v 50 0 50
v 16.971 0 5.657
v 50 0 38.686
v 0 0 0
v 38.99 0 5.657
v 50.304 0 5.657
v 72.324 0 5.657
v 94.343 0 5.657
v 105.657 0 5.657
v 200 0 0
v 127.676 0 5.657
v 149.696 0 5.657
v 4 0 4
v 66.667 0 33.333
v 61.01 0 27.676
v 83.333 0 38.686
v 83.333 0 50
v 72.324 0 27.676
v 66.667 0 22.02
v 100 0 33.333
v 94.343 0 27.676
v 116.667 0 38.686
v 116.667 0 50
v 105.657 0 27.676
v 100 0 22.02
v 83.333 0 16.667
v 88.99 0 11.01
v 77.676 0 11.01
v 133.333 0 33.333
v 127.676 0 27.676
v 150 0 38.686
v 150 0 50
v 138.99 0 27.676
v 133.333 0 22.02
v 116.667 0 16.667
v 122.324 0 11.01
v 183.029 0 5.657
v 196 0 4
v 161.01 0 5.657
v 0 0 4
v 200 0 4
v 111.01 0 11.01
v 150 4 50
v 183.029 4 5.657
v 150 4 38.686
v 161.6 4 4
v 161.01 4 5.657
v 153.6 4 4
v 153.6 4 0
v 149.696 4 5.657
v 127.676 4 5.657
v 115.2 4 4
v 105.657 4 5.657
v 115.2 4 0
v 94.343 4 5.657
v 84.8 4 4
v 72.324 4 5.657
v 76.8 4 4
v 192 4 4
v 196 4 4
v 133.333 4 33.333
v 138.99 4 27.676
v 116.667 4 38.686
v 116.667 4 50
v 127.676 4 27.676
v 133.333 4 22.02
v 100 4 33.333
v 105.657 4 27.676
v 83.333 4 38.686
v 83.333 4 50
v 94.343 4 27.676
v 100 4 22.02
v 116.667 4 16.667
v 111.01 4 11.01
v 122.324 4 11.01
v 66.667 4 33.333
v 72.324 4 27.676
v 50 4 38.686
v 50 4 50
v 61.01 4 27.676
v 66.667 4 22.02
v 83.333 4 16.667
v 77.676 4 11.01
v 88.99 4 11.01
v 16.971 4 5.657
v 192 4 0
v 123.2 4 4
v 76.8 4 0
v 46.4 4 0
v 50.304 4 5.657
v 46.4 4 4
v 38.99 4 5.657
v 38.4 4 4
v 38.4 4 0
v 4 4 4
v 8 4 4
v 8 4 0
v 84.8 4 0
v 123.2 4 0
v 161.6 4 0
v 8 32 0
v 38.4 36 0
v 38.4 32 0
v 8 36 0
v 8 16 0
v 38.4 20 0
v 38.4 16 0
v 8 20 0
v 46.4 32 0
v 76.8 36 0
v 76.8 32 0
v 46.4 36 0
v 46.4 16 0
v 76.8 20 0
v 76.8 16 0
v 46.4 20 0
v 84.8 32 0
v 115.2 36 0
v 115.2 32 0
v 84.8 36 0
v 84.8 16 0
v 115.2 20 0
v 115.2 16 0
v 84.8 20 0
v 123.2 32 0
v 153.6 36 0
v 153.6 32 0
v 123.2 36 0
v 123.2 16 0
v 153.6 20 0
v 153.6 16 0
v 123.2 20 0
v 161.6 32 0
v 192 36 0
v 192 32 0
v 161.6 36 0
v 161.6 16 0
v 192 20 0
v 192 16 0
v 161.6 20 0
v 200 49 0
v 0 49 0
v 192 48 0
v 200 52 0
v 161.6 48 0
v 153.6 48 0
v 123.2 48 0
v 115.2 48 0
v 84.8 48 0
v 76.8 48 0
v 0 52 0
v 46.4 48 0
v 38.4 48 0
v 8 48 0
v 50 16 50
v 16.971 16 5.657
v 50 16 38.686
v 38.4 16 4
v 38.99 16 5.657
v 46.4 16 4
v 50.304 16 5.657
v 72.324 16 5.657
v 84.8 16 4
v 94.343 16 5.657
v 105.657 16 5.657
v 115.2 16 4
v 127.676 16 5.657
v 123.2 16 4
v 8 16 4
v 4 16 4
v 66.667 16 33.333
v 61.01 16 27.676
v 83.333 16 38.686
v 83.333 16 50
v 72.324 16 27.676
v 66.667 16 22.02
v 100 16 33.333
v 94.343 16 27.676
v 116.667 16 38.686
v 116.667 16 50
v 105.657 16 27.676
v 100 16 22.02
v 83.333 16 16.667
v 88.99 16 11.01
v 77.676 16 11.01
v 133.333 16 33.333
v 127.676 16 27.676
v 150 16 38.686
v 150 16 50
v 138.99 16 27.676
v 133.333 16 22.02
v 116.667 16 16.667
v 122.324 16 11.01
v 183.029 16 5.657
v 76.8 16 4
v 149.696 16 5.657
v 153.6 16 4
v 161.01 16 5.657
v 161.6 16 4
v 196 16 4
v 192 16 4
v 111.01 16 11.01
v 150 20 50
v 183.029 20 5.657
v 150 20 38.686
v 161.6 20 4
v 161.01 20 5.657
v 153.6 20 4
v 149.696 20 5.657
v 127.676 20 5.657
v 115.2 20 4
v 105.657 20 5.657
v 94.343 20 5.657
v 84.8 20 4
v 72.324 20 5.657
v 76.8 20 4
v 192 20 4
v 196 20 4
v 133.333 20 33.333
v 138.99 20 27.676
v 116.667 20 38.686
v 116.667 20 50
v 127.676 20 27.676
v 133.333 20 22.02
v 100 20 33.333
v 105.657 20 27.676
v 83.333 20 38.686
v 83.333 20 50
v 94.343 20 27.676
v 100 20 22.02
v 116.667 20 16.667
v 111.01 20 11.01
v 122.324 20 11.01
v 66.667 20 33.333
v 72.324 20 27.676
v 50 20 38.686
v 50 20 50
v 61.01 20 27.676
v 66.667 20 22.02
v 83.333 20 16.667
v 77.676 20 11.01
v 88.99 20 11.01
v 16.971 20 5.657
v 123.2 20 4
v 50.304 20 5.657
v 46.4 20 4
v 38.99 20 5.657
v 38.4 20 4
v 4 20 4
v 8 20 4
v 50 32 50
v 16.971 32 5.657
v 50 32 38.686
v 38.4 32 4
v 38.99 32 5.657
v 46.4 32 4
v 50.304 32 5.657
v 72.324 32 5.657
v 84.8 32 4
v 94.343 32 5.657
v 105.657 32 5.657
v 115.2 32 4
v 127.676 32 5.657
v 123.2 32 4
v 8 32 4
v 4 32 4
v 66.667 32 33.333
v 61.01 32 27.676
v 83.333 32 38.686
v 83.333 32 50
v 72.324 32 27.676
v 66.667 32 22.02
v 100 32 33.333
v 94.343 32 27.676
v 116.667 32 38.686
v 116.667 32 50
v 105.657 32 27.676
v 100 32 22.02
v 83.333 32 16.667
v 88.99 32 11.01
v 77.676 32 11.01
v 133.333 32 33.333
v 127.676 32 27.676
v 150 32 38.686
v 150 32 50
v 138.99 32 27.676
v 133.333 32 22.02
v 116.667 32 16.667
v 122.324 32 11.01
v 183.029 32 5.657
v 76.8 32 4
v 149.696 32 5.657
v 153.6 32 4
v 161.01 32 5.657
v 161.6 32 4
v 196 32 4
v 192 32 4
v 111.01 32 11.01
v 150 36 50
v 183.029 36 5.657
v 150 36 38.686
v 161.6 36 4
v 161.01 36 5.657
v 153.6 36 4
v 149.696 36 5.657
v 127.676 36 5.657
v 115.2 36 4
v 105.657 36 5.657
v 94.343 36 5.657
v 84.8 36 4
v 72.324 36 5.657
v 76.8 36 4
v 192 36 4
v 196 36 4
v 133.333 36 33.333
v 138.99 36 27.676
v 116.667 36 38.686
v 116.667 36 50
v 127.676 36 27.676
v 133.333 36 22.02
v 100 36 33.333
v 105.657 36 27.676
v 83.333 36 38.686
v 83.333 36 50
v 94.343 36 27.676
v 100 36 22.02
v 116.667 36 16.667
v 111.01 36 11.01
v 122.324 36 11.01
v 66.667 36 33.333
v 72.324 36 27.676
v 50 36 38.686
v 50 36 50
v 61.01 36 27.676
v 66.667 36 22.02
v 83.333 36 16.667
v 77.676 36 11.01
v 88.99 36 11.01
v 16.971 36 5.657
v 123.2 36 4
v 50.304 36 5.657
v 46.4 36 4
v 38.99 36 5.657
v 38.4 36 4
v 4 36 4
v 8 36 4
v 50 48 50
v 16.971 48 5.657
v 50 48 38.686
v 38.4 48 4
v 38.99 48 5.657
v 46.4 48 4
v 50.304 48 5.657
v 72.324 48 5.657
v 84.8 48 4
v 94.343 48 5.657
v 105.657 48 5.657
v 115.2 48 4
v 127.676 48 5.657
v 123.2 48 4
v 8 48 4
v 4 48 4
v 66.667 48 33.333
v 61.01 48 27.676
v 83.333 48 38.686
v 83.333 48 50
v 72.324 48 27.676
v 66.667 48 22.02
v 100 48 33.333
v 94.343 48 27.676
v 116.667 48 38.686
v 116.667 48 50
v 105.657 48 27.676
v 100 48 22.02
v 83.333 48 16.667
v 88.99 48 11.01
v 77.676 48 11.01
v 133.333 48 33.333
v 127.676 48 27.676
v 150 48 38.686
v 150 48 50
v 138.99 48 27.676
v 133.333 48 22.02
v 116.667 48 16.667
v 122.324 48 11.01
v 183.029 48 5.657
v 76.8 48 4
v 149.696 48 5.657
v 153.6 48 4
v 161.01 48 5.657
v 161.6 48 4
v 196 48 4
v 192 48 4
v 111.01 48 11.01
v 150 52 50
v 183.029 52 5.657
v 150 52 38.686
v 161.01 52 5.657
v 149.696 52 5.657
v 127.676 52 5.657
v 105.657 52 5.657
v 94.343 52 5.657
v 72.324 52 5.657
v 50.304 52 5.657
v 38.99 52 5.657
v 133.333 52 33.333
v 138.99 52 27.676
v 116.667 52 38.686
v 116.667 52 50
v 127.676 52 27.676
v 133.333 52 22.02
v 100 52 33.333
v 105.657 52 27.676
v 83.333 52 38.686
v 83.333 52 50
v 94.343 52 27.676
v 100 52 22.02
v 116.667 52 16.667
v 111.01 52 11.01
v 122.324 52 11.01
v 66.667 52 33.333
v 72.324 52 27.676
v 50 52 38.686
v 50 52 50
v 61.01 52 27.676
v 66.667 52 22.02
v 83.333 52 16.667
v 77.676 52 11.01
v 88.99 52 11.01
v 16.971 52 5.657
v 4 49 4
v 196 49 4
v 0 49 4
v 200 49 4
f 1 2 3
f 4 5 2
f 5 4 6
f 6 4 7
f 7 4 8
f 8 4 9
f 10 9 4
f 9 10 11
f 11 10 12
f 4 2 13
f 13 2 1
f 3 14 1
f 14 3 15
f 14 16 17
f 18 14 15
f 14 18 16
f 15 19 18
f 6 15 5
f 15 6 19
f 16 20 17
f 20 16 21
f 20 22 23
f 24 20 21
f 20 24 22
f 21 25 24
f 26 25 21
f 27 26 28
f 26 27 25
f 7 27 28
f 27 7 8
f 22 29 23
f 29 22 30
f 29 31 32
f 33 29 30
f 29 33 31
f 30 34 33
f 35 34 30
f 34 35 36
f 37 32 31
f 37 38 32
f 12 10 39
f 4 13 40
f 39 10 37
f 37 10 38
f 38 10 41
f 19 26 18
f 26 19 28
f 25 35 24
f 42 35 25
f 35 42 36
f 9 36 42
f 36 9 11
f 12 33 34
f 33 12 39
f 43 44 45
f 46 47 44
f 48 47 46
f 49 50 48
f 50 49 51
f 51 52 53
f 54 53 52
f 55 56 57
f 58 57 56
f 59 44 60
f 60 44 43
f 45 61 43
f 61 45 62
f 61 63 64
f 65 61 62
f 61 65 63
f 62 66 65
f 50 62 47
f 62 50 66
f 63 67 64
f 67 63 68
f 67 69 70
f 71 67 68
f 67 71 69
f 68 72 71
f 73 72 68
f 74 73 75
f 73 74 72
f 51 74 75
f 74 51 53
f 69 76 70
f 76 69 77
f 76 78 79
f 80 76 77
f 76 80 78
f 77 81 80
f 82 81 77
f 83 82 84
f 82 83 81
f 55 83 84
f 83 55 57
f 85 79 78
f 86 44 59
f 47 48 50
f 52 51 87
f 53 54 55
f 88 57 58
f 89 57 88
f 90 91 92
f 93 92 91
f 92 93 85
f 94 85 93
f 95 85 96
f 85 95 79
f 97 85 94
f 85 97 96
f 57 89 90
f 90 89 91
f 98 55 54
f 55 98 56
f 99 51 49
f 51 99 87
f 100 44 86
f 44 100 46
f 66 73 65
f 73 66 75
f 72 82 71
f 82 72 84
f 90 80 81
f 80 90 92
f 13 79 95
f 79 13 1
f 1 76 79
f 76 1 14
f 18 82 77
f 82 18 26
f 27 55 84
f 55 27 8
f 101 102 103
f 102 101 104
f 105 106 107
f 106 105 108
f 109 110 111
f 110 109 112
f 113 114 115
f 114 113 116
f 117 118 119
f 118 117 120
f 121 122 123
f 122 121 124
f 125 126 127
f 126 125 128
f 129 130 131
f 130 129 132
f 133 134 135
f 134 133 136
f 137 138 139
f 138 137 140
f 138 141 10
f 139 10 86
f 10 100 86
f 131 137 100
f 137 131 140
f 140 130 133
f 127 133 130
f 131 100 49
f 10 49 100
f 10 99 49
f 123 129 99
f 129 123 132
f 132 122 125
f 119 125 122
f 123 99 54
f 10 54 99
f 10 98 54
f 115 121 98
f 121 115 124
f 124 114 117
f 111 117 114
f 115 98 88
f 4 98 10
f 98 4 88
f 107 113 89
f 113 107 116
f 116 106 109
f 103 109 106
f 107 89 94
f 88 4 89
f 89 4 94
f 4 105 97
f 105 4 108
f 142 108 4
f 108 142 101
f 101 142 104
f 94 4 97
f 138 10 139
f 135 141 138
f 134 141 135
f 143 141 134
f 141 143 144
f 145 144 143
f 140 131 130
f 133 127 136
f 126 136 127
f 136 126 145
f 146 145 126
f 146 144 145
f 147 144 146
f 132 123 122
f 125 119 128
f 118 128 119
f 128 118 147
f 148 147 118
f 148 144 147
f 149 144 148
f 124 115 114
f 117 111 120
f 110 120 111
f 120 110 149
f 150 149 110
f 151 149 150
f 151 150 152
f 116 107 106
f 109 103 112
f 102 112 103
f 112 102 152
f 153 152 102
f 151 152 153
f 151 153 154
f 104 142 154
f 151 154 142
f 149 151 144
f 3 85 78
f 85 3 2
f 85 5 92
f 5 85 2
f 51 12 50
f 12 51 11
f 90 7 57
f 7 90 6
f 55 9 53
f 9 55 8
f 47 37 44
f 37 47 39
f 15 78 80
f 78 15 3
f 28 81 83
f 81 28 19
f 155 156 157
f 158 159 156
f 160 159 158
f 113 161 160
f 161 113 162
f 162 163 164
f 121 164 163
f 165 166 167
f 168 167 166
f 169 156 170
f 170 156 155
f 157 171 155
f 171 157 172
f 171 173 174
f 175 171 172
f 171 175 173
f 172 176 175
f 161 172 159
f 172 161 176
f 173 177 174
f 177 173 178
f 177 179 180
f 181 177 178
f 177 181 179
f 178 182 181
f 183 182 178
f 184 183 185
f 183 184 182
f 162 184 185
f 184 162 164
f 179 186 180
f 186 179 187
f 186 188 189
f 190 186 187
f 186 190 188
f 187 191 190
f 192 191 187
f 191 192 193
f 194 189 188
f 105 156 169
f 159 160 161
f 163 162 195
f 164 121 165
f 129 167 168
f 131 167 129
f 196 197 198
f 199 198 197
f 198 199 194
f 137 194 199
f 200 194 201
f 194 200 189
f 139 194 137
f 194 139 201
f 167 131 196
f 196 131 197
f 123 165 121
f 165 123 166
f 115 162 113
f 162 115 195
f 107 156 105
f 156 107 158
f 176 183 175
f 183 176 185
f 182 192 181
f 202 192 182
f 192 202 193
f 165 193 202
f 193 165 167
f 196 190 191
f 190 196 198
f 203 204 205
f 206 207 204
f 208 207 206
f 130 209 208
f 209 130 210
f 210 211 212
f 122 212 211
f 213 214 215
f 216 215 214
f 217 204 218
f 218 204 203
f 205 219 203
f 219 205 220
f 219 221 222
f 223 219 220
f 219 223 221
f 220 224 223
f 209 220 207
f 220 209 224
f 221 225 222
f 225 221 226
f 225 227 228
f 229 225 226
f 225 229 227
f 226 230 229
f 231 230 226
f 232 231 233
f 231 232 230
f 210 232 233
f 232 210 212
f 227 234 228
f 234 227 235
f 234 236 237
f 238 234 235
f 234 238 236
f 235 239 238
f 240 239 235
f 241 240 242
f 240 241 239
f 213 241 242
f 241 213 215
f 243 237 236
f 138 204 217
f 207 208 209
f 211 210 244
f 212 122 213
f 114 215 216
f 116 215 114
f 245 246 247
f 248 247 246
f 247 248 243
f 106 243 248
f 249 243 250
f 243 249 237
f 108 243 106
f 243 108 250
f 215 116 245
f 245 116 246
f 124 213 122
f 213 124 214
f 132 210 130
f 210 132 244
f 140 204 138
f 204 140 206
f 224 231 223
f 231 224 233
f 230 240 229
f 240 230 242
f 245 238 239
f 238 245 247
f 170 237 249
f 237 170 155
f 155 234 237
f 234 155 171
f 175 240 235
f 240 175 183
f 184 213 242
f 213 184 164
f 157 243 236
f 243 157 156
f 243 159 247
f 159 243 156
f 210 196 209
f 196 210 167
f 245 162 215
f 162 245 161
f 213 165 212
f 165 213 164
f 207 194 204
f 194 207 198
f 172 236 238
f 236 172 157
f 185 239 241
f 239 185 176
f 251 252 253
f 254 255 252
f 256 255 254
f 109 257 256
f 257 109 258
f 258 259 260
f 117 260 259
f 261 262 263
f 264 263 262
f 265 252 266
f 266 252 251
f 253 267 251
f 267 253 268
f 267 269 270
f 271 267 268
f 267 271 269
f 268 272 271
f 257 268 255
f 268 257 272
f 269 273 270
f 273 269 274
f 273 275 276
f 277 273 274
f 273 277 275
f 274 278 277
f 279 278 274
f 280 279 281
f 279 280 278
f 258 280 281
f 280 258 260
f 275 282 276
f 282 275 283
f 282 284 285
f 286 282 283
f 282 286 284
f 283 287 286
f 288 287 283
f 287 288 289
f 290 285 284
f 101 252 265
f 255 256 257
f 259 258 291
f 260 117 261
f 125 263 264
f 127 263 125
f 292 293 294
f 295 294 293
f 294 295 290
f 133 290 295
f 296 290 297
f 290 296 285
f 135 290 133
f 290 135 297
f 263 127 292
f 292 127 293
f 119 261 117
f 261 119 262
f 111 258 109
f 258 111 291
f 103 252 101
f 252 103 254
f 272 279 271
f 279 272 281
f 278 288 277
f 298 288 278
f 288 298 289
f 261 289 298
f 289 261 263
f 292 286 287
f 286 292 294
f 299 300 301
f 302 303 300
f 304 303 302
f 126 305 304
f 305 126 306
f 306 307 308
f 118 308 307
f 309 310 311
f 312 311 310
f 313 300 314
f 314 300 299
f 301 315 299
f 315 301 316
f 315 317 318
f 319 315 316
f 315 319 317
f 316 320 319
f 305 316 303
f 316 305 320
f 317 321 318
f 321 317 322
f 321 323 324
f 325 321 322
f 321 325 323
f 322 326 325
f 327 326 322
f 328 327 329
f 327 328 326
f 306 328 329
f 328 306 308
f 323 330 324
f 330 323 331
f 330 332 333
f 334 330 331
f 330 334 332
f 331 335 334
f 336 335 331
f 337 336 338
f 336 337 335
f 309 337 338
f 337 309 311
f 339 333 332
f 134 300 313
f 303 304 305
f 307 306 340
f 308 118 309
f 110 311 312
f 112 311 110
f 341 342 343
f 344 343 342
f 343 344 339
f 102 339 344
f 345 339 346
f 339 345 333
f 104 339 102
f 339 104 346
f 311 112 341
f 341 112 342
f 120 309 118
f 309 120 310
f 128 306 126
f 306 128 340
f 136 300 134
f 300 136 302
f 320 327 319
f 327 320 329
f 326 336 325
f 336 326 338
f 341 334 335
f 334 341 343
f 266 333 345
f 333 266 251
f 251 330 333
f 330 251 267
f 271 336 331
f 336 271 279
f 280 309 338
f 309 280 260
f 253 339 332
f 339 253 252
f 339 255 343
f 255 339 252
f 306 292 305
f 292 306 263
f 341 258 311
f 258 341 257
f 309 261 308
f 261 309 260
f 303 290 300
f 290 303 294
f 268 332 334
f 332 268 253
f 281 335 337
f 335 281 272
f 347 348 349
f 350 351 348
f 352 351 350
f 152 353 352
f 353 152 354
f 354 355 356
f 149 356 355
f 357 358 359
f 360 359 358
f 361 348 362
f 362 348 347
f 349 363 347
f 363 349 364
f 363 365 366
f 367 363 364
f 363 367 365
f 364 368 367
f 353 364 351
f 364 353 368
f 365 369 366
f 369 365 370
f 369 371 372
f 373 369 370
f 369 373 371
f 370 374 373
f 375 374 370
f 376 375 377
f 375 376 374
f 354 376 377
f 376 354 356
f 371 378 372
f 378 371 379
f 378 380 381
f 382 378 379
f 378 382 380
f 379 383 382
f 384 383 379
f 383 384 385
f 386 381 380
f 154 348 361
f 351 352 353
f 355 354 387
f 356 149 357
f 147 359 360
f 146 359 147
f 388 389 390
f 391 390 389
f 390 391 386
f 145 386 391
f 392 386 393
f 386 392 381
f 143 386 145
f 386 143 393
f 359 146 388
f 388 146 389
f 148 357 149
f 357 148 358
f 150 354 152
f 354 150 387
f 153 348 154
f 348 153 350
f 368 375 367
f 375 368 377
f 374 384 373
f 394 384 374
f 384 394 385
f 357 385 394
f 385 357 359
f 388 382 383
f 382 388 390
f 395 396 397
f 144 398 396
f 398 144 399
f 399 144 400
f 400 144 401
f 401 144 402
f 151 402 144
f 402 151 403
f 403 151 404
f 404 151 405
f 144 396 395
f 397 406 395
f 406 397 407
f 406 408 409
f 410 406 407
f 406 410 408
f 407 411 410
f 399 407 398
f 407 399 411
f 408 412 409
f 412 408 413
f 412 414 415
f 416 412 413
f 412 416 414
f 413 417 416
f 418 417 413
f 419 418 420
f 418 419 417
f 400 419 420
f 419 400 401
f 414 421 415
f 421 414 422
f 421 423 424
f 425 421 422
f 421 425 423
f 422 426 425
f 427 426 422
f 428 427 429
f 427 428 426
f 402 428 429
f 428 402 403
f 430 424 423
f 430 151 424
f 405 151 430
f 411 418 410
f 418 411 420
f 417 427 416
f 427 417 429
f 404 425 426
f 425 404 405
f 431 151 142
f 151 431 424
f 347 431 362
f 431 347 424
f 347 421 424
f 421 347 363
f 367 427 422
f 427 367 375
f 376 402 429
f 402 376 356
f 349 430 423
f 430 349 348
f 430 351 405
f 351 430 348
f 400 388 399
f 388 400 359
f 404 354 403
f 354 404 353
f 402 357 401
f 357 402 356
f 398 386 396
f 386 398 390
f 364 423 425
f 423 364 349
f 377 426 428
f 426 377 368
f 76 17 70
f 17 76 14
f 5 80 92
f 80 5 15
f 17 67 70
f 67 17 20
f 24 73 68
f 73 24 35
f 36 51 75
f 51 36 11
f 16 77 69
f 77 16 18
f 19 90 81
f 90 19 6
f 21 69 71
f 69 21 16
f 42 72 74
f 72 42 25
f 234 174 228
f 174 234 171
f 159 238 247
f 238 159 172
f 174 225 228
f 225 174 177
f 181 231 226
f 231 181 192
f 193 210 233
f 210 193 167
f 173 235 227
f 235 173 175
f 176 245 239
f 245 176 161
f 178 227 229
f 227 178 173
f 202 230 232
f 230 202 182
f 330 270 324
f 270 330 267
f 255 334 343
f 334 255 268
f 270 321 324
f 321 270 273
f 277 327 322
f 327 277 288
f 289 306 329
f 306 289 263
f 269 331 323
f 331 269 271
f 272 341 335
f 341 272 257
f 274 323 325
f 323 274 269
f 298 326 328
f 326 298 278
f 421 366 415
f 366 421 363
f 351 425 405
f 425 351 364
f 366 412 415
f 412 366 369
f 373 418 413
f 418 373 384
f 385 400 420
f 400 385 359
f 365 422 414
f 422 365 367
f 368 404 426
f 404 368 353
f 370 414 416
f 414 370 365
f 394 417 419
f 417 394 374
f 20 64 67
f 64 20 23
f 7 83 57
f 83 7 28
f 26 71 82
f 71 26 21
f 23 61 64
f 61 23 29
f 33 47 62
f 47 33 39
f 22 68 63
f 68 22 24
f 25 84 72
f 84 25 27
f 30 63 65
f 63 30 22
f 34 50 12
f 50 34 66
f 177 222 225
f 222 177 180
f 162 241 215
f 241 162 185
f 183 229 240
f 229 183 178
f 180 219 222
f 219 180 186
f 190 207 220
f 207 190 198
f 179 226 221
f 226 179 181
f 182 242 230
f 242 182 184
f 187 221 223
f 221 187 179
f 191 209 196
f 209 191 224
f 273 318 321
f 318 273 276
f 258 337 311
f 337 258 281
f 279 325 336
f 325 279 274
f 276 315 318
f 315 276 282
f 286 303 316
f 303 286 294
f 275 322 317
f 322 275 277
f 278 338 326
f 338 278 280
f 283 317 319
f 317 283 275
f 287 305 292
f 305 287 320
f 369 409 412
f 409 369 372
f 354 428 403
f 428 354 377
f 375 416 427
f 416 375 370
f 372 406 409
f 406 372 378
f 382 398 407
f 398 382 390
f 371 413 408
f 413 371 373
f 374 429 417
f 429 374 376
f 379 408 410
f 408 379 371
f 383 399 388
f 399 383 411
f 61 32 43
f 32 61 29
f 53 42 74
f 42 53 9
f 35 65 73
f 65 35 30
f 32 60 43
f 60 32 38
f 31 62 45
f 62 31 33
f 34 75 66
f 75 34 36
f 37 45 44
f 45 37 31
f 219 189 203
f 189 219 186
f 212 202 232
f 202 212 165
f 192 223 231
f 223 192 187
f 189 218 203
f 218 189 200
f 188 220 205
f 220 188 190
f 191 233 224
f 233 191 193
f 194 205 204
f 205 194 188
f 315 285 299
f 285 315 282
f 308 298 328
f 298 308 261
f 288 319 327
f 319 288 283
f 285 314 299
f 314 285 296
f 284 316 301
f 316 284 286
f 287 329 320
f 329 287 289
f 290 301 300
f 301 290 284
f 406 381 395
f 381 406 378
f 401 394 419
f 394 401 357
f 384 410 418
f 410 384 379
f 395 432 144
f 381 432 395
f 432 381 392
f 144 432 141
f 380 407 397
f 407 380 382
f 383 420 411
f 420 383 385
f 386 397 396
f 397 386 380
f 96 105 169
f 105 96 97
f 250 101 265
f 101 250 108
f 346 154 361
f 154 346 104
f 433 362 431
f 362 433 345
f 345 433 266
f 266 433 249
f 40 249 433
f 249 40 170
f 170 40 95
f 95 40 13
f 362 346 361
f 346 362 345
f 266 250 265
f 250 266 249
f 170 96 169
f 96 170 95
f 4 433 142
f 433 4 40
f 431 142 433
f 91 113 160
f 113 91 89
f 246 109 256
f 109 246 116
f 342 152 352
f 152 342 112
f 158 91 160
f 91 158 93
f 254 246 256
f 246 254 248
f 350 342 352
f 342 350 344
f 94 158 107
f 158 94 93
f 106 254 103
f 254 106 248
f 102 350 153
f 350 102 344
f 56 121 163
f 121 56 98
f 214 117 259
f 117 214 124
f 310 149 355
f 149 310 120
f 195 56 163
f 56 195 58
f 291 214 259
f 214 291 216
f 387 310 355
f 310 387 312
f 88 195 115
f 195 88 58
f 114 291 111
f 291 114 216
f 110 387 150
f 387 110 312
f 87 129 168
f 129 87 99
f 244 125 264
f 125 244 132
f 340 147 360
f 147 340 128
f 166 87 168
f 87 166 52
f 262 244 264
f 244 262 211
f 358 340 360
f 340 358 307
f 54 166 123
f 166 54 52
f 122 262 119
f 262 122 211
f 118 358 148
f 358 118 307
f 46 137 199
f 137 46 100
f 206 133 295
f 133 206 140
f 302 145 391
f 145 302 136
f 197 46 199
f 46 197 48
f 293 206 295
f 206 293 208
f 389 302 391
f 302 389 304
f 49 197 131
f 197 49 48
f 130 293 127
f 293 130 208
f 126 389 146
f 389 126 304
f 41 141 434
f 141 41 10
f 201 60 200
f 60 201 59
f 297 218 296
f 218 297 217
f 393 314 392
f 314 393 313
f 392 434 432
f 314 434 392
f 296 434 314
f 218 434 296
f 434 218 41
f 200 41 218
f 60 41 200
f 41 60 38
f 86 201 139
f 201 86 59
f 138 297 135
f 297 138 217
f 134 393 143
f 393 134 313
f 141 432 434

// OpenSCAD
slot_gap = 12;
wall_width = 4;
slots = 3;
depth = wall_width*slots+1+slot_gap*(slots);
length = 170;
height = 50;
post_width = 8;


triangle_leg = sqrt(((2*height)^2)/2);
triangle_base = sqrt(2*triangle_leg^2);

module triangle() {
    triangle_points =[[0,0],[triangle_leg,0],[0,triangle_leg],[post_width,post_width],[triangle_leg-post_width*2,post_width],[post_width,triangle_leg-post_width*2]];
    triangle_paths =[[0,1,2],[3,4,5]];
    height_to_point = sqrt(2*(100*100))/2;
    translate([0,0,height]) rotate([0,135,0]) rotate([0,-90,-90]) linear_extrude(wall_width) polygon(triangle_points,triangle_paths,post_width);
}

for (i = [triangle_base/2:triangle_base/3:length]) {
    for (j = [0:slot_gap+wall_width:depth + 1]) {
        translate([i,j,0]) triangle();
     }
 }
 
 for (i = [0:(length+22)/5:length+22]) {
     translate([i, 0, 0]) cube([post_width, depth, wall_width]);
 }
